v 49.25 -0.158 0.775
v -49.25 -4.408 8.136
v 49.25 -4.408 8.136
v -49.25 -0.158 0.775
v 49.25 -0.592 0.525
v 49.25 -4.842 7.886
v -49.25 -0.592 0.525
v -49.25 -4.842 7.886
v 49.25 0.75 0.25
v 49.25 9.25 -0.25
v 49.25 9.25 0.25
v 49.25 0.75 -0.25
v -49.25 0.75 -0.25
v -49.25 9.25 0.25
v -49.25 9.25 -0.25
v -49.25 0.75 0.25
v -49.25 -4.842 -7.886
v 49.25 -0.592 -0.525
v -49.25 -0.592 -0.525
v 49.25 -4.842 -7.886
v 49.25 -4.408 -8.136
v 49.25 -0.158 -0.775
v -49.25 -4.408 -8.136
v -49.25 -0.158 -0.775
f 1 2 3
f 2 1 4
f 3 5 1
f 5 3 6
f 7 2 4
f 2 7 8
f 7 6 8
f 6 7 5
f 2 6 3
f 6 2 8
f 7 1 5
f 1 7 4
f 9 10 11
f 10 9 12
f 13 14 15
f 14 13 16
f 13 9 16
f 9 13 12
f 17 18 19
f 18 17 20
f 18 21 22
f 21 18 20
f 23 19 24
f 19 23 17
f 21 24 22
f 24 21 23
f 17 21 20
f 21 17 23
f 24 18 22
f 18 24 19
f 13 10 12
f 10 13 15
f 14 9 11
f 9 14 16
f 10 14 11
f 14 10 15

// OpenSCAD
// Generated by SolidPython 1.1.3 on 2022-07-08 02:15:18
$fn=200;


rotate(a = [0, 90, 0]) {
	union() {
		translate(v = [0, 5.0000000000, 0]) {
			cube(center = true, size = [0.5000000000, 8.5000000000, 98.5000000000]);
		}
		rotate(a = [0, 0, 0.0000000000]) {
			translate(v = [0, 5.0000000000, 0]) {
				cube(center = true, size = [0.5000000000, 8.5000000000, 98.5000000000]);
			}
		}
		rotate(a = [0, 0, 120.0000000000]) {
			union() {
				translate(v = [0, 5.0000000000, 0]) {
					cube(center = true, size = [0.5000000000, 8.5000000000, 98.5000000000]);
				}
				rotate(a = [0, 0, 0.0000000000]) {
					translate(v = [0, 5.0000000000, 0]) {
						cube(center = true, size = [0.5000000000, 8.5000000000, 98.5000000000]);
					}
				}
			}
		}
		rotate(a = [0, 0, 240.0000000000]) {
			union() {
				translate(v = [0, 5.0000000000, 0]) {
					cube(center = true, size = [0.5000000000, 8.5000000000, 98.5000000000]);
				}
				rotate(a = [0, 0, 0.0000000000]) {
					translate(v = [0, 5.0000000000, 0]) {
						cube(center = true, size = [0.5000000000, 8.5000000000, 98.5000000000]);
					}
				}
				rotate(a = [0, 0, 120.0000000000]) {
					union() {
						translate(v = [0, 5.0000000000, 0]) {
							cube(center = true, size = [0.5000000000, 8.5000000000, 98.5000000000]);
						}
						rotate(a = [0, 0, 0.0000000000]) {
							translate(v = [0, 5.0000000000, 0]) {
								cube(center = true, size = [0.5000000000, 8.5000000000, 98.5000000000]);
							}
						}
					}
				}
			}
		}
	}
}
/***********************************************
*********      SolidPython code:      **********
************************************************
 
from solid import *
from solid.utils import *
from math import asin, atan, pi, cos, sin, sqrt, tan, acos
import toml
import os


'''
a roomba brush for inserting nylon fibers into and zip tying 
together to form a disposable roomba brush. get an old broom and place tape across then cut.
place a belt of fibers into the wedge segments on either side, insert each wedge segment into the brush and zip tie.
insert the belt of fibers into the roomba brush

TODO: snap on to remove the need for zip ties
TODO: Can insert razors 
to chop hair that gets wound around the brush.
'''
def RoombaBrush(
    motor_insert_cube_profile,
    motor_insert_cube_length,
    stator_insert_cube_profile,
    stator_insert_cube_length,
    brush_length,
    brush_diameter,
    number_fins,
    fiber_diameter,
    wall_thickness,
):
    roomba_brush = None
    # create the cube for the stator side insert
    # TODO: frustrum cone instead as a bushing
    # stator_insert = cube(
    #     [stator_insert_cube_profile, stator_insert_cube_profile, stator_insert_cube_length], center=True)
    stator_insert = cylinder(
        r1=stator_insert_cube_profile-wall_thickness,
        r2=stator_insert_cube_profile,
        h=stator_insert_cube_length,
        center=True,
    )

    # create the cube for the motor side insert
    motor_insert = cube(
        [motor_insert_cube_profile, motor_insert_cube_profile, motor_insert_cube_length], center=True)

    # create a flange with inserts for each segment of the cylinder brush and attach to motor_insert and stator_insert
    flange = cylinder(
        r=brush_diameter, h=brush_length, center=True)
    # create guides for the fins as wall_thickness cubes 
    fin_guide = cube(
        [wall_thickness, brush_diameter-wall_thickness, brush_length-wall_thickness], center=True)
    fin_guide = translate([0, brush_diameter/2+wall_thickness/2, 0])(fin_guide)


    # calculate the degrees of rotation for each fin
    fin_rotation = 360 / number_fins
    # insert the fins atop the flange
    for i in range(number_fins):
        fin = rotate([0, 0, fin_rotation * i])(fin_guide)
        flange = flange-hole()(fin)
        # flange=flange+fin

    # place the flange on motor and stator inserts
    stator_insert = stator_insert + translate([0, 0, brush_length/2+stator_insert_cube_length/2])(flange)
    motor_insert = motor_insert 
    # rotate the inserts to be parallel to the x-axis
    stator_insert = rotate([0, -90, 0])(stator_insert)
    motor_insert = rotate([0, 90, 0])(motor_insert)
    
    # move the stator to the far side of the brush
    stator_insert = translate([brush_length+stator_insert_cube_profile/2,0,0])(stator_insert)
    # move the motor back to the yz plane
    motor_insert = translate([-motor_insert_cube_profile/2,0,0])(motor_insert)
    # get the degrees due to wall_thickness chord at brush_diameter
    chord_degrees = 360*wall_thickness/(pi*brush_diameter)

    # create a wedge for each segment of the brush that starts as arclength and ends as fiber_diameter
    # stuff fibers on either side and affix with glue or tape, this is temporary as zip ties will 
    # squeeze them against the barrell
    wedge= cube(
        [wall_thickness-2*fiber_diameter, brush_diameter-wall_thickness, brush_length-wall_thickness], center=True)
    wedge= translate([0,brush_diameter/2,0])(wedge)

    for i in range(number_fins):
        wedge = wedge + rotate([0, 0, fin_rotation * i])(wedge)

    wedge = rotate([0, 90, 0])(wedge)

    roomba_brush = stator_insert + motor_insert

    return roomba_brush, wedge 


def render_object(render_object, filename):
    """
    creates a .stl and .scad solution for the given solidpython OpenSCAD object
    PARAMETERS:
        render_object: the OpenSCAD object
        filename: a string for the file to be saved
    """
    scad_render_to_file(render_object, filename + ".scad", file_header="$fn=200;")
    # render with OpenSCAD
    print("Openscad is now rendering the solution..")
    os.system("openscad -o " + filename + ".stl " + filename + ".scad &")


if __name__ == "__main__":
    config = toml.load("configuration.toml")
    roomba_brush,wedge = RoombaBrush(**config)
    render_object(roomba_brush, "roomba_brush")
    render_object(wedge, "wedge")
 
 
************************************************/
